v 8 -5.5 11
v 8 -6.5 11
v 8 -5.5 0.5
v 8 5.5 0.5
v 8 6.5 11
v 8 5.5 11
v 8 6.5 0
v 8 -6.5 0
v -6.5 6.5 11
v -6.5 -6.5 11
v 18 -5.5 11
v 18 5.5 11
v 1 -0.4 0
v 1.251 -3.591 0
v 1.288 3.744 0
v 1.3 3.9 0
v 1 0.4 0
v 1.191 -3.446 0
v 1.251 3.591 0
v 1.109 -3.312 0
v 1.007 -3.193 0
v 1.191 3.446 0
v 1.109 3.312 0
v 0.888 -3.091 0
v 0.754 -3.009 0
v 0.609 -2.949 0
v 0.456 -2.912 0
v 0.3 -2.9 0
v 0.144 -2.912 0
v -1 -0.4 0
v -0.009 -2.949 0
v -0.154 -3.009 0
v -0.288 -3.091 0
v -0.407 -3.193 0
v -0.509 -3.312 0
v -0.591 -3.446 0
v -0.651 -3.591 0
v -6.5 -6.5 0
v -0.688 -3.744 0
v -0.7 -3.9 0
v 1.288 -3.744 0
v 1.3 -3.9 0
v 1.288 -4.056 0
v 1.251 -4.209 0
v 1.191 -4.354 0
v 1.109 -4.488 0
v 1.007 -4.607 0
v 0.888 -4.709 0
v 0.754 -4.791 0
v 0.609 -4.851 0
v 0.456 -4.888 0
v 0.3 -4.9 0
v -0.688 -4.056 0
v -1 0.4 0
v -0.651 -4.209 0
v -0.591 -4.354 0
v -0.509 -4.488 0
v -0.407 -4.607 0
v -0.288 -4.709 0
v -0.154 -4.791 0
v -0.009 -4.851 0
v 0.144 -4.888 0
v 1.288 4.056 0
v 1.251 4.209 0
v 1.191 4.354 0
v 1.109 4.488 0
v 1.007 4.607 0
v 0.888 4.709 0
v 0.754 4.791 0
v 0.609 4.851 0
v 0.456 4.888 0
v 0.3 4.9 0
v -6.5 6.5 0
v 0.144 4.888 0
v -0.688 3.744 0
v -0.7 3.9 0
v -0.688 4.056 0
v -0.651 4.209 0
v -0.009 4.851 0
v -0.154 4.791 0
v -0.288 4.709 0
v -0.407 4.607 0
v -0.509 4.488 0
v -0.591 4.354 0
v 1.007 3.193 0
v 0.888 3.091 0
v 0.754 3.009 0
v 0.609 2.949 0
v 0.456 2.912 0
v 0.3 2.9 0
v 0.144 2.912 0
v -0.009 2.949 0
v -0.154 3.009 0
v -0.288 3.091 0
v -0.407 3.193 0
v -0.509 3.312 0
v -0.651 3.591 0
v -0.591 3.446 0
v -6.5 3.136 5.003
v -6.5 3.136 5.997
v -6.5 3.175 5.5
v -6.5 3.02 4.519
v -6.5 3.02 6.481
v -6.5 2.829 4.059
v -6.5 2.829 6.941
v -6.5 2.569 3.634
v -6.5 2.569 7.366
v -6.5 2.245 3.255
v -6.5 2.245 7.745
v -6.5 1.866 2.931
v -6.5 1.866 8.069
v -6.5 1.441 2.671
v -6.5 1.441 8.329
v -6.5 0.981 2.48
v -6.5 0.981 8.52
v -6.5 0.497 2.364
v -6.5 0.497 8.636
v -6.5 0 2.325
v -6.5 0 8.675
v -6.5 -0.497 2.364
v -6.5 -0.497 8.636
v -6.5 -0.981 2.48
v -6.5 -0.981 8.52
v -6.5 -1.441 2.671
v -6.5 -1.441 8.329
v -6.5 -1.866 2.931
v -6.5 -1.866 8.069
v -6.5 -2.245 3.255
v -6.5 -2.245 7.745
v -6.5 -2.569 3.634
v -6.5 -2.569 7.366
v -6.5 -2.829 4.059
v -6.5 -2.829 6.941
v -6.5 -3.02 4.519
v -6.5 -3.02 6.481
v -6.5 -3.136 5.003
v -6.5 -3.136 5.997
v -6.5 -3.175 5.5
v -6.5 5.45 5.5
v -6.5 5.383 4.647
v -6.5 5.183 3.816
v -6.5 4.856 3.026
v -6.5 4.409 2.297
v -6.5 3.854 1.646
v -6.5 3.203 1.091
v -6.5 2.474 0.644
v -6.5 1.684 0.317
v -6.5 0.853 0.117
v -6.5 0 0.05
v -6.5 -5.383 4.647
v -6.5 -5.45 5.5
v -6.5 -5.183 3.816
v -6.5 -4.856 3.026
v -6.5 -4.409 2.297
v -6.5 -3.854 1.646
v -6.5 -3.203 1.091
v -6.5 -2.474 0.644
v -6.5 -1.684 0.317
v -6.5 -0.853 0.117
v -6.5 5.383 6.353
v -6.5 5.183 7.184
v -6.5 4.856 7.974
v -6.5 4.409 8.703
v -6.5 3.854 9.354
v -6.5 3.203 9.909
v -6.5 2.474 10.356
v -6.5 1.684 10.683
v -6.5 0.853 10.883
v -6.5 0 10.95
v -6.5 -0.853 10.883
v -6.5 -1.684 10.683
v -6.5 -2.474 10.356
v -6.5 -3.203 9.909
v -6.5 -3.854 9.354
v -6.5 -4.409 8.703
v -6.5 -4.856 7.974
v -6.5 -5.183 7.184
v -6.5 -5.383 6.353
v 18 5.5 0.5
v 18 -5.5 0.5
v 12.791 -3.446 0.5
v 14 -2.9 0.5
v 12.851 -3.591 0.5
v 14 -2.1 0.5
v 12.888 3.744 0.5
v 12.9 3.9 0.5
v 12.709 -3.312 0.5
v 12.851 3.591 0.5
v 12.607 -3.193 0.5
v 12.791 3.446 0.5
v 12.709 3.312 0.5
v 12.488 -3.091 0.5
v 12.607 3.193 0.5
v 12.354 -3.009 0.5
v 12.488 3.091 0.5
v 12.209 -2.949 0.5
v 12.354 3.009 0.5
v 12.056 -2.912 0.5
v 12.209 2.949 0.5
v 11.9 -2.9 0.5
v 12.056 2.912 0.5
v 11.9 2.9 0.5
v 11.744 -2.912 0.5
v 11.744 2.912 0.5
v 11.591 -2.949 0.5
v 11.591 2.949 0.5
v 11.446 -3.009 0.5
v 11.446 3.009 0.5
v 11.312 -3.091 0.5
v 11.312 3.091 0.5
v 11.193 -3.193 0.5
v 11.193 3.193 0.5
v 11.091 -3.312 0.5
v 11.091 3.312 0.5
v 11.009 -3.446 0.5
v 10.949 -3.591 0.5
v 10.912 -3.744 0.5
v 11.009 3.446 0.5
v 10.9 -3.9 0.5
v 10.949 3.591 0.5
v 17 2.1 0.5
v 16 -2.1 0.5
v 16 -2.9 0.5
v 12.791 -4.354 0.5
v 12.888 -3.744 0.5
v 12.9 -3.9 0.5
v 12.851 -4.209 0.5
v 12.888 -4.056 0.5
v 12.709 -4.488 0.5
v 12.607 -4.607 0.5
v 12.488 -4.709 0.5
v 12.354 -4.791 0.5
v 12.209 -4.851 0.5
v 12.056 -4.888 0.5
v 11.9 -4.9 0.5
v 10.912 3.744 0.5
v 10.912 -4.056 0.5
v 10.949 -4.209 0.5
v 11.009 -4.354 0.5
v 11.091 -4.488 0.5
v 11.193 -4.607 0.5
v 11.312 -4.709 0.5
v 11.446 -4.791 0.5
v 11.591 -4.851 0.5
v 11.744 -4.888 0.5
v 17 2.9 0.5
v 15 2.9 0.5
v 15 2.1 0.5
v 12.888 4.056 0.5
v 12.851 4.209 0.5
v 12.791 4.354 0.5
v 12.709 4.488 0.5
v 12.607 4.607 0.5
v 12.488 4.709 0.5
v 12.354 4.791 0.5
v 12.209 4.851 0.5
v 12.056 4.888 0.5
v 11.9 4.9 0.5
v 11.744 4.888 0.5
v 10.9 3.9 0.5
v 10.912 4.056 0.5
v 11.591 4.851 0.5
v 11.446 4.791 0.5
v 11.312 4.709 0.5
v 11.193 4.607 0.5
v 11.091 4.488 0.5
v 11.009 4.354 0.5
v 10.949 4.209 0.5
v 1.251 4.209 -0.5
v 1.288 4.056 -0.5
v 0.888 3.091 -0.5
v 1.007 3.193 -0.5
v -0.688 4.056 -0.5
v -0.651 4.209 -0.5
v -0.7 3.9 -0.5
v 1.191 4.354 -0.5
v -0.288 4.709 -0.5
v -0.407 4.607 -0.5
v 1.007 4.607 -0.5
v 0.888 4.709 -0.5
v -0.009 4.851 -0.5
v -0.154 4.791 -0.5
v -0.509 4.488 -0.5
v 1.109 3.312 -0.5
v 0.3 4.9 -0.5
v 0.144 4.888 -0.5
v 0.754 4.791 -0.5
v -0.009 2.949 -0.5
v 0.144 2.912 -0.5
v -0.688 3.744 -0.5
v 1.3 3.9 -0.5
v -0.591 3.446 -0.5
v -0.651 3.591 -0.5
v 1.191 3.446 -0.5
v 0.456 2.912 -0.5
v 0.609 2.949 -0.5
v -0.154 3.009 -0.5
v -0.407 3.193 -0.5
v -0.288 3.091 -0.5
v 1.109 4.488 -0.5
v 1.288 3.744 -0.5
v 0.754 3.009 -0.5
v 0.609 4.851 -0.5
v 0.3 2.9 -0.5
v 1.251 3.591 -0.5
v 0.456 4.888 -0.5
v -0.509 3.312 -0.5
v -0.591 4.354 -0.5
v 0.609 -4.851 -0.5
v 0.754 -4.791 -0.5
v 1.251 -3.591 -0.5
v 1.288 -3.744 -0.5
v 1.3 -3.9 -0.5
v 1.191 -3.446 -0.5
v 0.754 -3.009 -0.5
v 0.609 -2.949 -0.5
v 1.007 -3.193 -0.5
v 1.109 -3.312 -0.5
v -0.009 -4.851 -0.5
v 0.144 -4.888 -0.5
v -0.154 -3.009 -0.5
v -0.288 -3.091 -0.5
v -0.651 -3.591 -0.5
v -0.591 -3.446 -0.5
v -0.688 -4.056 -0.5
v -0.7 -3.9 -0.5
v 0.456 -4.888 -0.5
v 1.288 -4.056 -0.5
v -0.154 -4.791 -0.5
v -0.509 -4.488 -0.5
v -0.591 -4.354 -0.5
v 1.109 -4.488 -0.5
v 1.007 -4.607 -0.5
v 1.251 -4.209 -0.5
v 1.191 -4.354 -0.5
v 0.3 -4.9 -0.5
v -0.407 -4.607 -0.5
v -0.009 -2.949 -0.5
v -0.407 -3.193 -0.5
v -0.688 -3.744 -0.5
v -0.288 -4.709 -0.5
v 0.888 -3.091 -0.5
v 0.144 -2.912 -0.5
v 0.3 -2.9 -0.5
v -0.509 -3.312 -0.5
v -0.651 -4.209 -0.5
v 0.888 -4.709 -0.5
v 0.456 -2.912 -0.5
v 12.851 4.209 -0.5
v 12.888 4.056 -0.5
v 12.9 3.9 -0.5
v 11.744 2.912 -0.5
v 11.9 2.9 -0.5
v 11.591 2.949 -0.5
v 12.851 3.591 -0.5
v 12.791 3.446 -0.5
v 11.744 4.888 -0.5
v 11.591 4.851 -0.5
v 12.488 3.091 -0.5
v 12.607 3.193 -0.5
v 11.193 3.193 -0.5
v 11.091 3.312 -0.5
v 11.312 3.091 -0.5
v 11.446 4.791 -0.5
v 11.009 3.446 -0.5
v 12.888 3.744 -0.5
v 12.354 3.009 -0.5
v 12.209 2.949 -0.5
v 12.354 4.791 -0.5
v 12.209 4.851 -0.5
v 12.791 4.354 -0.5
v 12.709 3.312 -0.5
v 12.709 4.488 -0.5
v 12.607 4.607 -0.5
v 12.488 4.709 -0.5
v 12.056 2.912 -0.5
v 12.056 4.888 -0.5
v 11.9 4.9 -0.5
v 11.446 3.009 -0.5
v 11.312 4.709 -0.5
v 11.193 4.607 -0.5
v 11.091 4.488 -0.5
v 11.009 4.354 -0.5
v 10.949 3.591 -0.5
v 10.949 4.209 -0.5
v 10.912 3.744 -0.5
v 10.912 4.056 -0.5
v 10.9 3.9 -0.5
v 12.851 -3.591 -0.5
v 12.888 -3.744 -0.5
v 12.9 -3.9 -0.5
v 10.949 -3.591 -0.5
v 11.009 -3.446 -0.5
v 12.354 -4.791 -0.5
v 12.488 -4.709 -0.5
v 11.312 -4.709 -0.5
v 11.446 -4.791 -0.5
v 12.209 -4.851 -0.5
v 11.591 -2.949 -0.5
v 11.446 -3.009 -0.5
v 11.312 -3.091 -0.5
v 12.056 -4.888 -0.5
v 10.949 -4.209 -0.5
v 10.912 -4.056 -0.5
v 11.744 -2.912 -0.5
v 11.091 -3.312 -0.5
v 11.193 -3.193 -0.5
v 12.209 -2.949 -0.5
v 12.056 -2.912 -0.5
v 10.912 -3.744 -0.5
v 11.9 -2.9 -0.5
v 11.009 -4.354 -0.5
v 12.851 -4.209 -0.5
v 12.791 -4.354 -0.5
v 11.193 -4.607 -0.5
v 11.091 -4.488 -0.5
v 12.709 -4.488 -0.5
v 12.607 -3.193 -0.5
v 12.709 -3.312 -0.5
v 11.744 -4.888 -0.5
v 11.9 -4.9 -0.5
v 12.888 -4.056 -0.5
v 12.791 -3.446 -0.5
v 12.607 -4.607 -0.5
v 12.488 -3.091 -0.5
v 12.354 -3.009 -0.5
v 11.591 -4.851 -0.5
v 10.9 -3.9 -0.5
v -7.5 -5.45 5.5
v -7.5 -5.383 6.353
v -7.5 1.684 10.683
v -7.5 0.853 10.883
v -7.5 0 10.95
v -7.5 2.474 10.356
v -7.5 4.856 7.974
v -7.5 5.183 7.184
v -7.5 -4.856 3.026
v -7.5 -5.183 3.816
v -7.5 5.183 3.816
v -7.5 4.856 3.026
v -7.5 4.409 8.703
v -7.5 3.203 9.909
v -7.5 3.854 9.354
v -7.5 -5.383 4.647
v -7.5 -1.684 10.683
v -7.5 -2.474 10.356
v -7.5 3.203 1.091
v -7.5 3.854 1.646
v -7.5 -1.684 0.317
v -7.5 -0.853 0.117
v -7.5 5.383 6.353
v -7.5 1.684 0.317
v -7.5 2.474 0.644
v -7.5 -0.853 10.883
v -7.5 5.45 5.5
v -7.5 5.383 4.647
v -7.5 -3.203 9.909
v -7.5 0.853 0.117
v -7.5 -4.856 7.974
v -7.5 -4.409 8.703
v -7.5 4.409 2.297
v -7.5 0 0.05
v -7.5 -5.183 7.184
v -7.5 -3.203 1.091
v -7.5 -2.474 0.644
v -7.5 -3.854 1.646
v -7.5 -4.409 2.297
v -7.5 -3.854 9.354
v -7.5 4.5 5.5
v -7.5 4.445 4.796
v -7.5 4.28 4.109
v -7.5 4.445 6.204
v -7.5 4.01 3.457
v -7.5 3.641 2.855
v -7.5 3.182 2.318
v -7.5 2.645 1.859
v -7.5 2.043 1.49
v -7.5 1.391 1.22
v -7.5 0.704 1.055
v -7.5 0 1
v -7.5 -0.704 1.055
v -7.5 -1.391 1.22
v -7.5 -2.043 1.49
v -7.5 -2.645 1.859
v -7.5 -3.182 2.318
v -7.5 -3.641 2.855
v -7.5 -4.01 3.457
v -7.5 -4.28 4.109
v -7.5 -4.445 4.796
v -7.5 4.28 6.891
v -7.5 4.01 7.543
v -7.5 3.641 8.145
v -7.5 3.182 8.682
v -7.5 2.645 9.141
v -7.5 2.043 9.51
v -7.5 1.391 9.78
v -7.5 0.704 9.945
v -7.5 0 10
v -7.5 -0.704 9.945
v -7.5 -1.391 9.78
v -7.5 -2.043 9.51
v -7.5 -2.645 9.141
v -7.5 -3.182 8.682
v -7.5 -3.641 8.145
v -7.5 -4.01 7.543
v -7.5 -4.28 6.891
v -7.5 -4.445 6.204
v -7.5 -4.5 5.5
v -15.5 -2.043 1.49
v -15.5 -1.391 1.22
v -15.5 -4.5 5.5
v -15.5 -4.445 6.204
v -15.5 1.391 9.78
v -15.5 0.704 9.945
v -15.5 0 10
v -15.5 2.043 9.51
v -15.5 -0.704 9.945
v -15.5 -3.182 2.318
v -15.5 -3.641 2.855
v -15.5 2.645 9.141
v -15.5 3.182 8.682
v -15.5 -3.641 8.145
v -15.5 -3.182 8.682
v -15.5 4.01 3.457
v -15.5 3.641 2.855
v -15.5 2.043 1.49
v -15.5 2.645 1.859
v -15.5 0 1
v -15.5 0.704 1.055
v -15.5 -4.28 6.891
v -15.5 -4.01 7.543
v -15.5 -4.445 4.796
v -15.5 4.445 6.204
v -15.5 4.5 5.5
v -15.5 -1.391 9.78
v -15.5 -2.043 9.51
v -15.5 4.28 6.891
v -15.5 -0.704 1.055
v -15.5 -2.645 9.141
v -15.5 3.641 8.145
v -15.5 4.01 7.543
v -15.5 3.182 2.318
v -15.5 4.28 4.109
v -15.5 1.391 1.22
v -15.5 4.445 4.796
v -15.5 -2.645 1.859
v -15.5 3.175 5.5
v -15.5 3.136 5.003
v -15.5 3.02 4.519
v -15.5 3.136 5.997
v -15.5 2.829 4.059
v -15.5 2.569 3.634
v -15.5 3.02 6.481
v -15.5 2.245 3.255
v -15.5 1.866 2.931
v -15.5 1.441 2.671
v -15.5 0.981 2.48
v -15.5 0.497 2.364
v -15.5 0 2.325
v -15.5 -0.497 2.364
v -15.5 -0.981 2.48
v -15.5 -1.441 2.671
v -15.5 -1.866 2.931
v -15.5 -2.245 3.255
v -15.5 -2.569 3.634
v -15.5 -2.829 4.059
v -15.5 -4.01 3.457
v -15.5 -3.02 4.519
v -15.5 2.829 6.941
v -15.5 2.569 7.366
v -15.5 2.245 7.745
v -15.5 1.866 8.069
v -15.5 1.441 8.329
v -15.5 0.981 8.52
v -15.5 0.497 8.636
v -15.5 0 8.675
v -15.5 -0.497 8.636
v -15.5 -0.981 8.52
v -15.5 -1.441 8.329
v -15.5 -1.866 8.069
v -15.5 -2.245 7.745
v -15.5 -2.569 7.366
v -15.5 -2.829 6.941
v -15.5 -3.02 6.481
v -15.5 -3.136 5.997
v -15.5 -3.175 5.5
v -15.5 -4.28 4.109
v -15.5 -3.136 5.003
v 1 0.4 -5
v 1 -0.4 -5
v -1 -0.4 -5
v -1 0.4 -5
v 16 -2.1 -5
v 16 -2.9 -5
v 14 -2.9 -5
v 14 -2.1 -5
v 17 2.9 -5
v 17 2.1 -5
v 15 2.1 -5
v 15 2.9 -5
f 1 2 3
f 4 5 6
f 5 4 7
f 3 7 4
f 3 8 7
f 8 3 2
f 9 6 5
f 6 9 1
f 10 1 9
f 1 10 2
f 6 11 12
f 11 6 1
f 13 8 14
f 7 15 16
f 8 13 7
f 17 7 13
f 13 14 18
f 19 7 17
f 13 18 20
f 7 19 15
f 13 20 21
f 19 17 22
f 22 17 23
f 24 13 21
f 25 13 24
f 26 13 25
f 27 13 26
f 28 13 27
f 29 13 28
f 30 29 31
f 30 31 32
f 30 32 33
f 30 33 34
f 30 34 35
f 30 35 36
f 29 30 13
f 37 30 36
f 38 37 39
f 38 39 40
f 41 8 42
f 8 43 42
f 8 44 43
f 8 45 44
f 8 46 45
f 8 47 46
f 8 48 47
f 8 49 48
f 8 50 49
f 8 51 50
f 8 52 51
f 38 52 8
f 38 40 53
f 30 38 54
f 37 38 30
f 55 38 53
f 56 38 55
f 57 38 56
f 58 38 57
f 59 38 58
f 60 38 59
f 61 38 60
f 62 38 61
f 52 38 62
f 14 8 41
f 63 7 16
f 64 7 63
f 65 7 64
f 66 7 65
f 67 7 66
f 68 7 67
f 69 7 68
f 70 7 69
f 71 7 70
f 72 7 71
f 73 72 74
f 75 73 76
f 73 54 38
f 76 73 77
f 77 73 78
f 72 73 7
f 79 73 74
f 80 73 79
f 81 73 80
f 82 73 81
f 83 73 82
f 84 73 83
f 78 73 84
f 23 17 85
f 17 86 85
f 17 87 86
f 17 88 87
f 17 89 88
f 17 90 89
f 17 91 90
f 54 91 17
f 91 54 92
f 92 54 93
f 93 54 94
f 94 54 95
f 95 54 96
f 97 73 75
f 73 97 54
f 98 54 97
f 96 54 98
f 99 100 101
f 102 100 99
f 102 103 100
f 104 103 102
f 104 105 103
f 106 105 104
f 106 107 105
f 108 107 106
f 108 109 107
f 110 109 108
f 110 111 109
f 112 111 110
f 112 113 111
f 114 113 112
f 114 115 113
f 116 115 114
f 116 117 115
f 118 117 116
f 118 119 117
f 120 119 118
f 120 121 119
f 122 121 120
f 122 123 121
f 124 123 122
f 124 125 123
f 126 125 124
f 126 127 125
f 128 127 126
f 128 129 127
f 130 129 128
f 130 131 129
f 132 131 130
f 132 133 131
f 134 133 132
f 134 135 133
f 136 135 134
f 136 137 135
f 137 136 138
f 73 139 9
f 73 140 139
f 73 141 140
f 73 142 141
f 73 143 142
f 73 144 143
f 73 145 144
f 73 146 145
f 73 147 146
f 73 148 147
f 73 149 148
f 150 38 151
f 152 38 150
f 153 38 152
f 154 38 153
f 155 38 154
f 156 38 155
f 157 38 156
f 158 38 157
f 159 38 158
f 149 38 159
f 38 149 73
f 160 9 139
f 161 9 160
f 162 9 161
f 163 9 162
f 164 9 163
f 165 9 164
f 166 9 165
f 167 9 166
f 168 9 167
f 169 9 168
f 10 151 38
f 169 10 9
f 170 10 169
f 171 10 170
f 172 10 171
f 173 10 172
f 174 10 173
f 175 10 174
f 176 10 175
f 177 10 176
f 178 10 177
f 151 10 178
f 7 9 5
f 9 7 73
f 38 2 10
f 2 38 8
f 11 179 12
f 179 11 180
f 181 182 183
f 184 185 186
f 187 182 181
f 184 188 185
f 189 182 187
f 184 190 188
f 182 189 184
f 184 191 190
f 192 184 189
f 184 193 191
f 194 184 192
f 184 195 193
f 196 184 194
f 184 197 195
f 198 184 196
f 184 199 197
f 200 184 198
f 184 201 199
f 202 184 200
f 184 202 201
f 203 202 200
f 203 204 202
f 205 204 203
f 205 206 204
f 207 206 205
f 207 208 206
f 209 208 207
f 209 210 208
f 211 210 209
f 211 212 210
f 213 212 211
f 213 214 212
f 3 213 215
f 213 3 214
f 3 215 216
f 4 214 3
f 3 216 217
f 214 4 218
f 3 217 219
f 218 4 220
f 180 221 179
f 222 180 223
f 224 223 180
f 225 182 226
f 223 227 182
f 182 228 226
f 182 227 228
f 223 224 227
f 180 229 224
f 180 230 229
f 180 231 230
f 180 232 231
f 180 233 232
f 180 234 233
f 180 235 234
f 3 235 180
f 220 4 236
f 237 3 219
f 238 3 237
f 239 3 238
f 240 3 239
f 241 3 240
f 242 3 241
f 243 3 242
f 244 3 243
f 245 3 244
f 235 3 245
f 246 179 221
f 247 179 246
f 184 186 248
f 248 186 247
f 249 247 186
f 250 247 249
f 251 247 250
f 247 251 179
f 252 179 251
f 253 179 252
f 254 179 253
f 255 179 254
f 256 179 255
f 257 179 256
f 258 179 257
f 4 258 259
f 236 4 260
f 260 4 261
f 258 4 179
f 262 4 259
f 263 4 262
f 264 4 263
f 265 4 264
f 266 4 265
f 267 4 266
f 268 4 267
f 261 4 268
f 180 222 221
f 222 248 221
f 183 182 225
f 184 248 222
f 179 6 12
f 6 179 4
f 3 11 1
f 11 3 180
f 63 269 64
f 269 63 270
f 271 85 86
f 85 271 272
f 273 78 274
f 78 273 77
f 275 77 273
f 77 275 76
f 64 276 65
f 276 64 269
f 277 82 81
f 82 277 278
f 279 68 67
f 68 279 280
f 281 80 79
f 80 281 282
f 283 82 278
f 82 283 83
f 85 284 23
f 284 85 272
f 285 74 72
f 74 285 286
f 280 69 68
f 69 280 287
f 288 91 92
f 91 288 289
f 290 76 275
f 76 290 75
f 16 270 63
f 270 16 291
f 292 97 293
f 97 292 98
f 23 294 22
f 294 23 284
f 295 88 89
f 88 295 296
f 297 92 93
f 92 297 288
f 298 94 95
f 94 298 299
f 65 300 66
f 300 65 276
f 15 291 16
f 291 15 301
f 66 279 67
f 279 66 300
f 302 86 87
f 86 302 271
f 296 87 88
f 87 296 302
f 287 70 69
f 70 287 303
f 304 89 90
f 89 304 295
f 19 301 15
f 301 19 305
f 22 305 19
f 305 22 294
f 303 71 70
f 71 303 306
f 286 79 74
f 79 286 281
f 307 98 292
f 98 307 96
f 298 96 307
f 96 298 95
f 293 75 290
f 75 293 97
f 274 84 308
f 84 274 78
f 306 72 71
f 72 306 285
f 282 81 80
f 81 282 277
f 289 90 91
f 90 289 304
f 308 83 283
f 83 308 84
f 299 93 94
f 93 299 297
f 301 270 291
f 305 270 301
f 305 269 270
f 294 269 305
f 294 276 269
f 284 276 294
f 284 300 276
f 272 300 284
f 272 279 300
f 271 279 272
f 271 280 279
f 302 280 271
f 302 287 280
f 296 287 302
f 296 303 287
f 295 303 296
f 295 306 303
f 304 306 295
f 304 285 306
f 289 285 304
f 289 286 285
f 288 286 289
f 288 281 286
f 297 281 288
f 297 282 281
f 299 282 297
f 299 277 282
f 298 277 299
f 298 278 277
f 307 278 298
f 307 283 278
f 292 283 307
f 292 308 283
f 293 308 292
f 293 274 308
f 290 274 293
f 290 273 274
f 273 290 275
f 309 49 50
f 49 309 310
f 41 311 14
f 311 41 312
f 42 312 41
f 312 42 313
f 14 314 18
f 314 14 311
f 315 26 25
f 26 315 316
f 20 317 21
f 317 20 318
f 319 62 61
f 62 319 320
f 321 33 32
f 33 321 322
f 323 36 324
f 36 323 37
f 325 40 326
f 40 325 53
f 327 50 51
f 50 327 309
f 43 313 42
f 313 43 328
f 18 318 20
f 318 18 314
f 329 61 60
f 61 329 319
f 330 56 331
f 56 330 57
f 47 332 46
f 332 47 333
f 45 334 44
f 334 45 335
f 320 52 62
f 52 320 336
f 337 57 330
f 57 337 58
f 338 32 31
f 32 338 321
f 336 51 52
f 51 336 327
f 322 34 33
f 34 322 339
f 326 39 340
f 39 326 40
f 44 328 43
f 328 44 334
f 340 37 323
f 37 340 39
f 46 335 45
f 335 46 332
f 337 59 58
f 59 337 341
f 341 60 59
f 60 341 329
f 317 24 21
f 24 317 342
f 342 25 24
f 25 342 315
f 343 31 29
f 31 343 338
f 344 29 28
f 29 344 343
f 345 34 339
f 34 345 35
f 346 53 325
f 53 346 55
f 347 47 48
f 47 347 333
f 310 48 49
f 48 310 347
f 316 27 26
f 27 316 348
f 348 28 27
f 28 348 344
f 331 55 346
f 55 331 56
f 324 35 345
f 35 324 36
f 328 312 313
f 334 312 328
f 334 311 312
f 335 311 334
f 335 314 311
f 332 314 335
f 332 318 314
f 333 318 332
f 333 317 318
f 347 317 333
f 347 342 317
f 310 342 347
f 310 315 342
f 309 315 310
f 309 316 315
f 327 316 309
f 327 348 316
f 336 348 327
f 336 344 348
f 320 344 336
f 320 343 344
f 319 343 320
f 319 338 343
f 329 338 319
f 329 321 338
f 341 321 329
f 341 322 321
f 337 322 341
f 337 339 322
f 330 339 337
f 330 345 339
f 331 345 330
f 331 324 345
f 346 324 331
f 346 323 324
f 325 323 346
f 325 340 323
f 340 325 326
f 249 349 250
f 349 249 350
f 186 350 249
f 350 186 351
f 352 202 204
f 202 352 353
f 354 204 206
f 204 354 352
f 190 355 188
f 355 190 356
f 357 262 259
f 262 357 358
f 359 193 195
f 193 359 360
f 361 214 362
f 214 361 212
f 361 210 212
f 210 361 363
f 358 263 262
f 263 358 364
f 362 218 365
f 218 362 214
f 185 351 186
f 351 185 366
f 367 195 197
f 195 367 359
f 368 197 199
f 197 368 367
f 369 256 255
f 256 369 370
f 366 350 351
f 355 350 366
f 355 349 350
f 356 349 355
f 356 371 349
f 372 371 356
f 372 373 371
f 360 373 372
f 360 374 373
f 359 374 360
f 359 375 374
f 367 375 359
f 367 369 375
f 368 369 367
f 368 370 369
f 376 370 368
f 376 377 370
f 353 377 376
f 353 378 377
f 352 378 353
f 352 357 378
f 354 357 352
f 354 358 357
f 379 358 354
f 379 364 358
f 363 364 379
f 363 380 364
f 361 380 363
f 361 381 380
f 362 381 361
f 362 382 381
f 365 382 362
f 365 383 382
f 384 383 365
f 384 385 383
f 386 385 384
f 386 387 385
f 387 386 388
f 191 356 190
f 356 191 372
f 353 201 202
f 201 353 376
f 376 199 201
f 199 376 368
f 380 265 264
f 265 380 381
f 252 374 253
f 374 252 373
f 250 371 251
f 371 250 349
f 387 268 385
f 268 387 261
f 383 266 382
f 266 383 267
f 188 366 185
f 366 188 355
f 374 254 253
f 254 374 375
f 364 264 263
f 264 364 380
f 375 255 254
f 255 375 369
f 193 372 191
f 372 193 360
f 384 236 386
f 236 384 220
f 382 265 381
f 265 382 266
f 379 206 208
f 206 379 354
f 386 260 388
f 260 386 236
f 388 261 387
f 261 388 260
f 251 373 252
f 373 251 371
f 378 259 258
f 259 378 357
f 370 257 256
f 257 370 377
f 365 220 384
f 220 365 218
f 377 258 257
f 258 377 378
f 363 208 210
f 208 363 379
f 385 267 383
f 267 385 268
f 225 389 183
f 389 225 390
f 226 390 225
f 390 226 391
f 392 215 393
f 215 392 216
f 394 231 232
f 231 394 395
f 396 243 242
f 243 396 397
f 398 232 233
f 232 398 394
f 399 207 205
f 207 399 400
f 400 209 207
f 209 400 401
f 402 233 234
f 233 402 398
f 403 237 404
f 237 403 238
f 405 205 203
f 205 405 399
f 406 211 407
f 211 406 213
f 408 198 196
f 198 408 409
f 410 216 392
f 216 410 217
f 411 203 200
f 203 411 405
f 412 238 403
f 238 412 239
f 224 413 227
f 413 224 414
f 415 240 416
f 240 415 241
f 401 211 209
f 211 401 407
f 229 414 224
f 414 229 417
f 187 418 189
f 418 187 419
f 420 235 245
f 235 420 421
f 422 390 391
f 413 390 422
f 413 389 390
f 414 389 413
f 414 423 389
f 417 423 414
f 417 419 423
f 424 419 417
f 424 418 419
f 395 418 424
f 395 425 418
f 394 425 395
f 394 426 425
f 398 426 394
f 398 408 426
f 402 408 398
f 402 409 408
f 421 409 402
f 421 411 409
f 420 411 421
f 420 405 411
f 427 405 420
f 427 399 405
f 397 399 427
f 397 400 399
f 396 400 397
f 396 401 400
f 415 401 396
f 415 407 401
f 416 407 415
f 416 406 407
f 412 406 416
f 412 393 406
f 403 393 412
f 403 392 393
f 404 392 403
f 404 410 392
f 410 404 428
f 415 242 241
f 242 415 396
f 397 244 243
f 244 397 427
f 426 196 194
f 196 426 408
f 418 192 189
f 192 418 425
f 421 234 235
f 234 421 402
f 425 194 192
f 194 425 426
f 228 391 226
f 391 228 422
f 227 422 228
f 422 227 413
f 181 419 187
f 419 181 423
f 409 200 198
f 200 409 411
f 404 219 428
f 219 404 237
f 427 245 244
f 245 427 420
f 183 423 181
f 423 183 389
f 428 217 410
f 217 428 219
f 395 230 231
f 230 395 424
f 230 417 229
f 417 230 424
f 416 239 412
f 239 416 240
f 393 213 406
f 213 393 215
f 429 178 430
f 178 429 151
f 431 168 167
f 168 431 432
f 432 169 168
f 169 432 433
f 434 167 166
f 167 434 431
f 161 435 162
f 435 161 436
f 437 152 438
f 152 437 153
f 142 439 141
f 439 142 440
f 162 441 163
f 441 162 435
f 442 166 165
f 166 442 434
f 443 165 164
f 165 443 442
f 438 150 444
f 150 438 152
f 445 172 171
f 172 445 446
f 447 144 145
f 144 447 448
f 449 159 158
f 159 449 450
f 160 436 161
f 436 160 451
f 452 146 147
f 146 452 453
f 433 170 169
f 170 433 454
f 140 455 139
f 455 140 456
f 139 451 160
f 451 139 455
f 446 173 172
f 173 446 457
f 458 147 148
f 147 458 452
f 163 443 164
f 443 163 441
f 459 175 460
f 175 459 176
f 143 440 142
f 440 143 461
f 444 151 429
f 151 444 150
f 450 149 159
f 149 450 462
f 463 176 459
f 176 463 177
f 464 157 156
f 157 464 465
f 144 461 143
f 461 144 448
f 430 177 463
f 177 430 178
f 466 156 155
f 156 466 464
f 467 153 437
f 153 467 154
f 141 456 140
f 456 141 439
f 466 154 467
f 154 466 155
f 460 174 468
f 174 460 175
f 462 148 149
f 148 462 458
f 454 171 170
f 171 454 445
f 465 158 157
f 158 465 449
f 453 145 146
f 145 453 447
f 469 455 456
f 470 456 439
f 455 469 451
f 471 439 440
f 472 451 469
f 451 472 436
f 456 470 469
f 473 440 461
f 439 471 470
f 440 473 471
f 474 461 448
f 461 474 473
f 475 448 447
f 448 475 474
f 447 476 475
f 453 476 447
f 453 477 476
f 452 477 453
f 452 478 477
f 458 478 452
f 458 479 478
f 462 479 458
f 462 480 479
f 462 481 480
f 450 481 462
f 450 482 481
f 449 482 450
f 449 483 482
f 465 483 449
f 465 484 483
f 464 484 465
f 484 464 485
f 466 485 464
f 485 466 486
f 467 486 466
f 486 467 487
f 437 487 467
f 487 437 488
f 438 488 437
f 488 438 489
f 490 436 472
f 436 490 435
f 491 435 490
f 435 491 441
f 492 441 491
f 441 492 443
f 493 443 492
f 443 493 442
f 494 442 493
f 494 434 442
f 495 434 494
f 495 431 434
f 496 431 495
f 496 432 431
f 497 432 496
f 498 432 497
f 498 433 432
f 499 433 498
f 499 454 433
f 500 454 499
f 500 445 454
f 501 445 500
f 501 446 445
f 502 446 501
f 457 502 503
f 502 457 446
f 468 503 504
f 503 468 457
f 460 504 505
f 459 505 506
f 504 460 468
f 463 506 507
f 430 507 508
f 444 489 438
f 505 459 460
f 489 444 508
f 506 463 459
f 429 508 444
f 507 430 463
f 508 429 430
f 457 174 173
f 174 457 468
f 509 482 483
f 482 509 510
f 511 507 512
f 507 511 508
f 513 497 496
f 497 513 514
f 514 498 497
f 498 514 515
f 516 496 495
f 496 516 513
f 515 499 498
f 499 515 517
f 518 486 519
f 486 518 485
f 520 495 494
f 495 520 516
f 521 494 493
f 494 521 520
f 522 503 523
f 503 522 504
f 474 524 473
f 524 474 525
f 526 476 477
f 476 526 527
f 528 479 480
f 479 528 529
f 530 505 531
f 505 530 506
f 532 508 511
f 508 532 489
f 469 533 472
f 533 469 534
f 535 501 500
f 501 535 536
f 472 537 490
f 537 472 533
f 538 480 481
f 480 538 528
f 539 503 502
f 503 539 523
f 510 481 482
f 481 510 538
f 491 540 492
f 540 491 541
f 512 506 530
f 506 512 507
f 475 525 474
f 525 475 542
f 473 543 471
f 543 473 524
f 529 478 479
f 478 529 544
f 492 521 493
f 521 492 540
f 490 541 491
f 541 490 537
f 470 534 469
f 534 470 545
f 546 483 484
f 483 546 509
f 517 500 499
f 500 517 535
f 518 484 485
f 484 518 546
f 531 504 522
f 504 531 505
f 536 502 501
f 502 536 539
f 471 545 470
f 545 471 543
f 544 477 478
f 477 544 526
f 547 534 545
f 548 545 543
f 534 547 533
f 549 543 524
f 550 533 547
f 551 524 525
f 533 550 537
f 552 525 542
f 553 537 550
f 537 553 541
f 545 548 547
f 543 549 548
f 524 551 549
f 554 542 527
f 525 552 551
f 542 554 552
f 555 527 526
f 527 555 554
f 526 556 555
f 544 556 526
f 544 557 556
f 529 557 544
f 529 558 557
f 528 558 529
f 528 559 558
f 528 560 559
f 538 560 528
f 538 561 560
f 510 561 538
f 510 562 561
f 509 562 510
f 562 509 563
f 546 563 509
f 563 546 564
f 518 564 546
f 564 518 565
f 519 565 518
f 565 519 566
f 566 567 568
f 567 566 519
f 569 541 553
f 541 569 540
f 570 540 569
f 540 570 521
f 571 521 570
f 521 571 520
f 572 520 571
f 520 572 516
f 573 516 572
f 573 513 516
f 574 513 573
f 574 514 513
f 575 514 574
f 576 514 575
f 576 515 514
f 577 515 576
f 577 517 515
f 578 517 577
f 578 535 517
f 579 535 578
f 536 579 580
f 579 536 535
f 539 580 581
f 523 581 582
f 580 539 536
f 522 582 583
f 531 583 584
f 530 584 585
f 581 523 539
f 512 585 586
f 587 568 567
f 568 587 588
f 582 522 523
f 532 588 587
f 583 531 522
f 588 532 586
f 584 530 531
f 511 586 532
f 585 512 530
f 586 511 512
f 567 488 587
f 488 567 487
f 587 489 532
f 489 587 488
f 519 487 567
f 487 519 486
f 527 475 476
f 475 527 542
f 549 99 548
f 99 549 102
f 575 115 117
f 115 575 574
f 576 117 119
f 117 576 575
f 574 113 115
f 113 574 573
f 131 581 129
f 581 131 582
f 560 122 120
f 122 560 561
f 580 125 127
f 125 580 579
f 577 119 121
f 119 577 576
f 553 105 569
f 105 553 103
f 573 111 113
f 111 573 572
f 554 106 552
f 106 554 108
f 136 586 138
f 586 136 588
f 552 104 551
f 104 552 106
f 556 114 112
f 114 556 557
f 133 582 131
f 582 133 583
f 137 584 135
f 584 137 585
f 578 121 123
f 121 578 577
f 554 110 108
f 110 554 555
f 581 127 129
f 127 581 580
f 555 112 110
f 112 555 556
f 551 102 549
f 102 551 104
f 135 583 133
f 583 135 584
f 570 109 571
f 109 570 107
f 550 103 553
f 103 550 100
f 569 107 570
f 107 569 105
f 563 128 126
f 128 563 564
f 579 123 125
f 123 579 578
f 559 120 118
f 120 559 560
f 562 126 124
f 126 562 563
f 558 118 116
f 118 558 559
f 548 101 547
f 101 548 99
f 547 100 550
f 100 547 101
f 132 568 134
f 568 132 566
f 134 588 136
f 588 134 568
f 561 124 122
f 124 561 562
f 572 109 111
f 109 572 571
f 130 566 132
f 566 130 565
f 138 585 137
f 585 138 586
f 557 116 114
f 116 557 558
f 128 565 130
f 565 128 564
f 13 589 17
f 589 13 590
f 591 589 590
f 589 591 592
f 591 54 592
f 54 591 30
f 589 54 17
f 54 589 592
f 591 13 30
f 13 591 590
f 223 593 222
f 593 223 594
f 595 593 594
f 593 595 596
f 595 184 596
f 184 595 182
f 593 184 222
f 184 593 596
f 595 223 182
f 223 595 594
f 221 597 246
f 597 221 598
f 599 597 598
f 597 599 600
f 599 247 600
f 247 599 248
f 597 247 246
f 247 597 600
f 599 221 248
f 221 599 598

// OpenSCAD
$fn=40;

black = [0.2,0.2,0.2];
silver = [0.75,0.75,0.75];

// The model is centered on the front pin
// as per the data sheet
pins = [ [0, 0], [15, -2.5], [16, 2.5]];

feet = [ [ 0.3,3.9], [ 0.3,-3.9],
	 [11.9,3.9], [11.9,-3.9] ];

module body()
{
    translate([-6.5,-6.5])
	cube([14.5,13,11]);
    translate([8,-5.5,0.5])
	cube([10,11,10.5]);
}

module barrel()
{
    translate([-6.5,0,5.5]) rotate([0,-90,0])
	difference() {
	    union() {
		cylinder(1, d=10.9);
		cylinder(9, d=9);
	    }
	    translate([0,0,-1]) cylinder(12, d=6.35);
	}
}

module ck635()
{
    color(black) {
	body();

	// Feet or locating pins..
	translate([0,0,-0.5]) for (pos = feet)
	    translate(pos) cylinder(2, d=2);
    }

    color(silver) {
	barrel();

	// Pins
	for (pos = pins)
	    translate(pos) translate([0,0,-2]) cube([2,0.8,6], center=true);
    }
}

ck635();
